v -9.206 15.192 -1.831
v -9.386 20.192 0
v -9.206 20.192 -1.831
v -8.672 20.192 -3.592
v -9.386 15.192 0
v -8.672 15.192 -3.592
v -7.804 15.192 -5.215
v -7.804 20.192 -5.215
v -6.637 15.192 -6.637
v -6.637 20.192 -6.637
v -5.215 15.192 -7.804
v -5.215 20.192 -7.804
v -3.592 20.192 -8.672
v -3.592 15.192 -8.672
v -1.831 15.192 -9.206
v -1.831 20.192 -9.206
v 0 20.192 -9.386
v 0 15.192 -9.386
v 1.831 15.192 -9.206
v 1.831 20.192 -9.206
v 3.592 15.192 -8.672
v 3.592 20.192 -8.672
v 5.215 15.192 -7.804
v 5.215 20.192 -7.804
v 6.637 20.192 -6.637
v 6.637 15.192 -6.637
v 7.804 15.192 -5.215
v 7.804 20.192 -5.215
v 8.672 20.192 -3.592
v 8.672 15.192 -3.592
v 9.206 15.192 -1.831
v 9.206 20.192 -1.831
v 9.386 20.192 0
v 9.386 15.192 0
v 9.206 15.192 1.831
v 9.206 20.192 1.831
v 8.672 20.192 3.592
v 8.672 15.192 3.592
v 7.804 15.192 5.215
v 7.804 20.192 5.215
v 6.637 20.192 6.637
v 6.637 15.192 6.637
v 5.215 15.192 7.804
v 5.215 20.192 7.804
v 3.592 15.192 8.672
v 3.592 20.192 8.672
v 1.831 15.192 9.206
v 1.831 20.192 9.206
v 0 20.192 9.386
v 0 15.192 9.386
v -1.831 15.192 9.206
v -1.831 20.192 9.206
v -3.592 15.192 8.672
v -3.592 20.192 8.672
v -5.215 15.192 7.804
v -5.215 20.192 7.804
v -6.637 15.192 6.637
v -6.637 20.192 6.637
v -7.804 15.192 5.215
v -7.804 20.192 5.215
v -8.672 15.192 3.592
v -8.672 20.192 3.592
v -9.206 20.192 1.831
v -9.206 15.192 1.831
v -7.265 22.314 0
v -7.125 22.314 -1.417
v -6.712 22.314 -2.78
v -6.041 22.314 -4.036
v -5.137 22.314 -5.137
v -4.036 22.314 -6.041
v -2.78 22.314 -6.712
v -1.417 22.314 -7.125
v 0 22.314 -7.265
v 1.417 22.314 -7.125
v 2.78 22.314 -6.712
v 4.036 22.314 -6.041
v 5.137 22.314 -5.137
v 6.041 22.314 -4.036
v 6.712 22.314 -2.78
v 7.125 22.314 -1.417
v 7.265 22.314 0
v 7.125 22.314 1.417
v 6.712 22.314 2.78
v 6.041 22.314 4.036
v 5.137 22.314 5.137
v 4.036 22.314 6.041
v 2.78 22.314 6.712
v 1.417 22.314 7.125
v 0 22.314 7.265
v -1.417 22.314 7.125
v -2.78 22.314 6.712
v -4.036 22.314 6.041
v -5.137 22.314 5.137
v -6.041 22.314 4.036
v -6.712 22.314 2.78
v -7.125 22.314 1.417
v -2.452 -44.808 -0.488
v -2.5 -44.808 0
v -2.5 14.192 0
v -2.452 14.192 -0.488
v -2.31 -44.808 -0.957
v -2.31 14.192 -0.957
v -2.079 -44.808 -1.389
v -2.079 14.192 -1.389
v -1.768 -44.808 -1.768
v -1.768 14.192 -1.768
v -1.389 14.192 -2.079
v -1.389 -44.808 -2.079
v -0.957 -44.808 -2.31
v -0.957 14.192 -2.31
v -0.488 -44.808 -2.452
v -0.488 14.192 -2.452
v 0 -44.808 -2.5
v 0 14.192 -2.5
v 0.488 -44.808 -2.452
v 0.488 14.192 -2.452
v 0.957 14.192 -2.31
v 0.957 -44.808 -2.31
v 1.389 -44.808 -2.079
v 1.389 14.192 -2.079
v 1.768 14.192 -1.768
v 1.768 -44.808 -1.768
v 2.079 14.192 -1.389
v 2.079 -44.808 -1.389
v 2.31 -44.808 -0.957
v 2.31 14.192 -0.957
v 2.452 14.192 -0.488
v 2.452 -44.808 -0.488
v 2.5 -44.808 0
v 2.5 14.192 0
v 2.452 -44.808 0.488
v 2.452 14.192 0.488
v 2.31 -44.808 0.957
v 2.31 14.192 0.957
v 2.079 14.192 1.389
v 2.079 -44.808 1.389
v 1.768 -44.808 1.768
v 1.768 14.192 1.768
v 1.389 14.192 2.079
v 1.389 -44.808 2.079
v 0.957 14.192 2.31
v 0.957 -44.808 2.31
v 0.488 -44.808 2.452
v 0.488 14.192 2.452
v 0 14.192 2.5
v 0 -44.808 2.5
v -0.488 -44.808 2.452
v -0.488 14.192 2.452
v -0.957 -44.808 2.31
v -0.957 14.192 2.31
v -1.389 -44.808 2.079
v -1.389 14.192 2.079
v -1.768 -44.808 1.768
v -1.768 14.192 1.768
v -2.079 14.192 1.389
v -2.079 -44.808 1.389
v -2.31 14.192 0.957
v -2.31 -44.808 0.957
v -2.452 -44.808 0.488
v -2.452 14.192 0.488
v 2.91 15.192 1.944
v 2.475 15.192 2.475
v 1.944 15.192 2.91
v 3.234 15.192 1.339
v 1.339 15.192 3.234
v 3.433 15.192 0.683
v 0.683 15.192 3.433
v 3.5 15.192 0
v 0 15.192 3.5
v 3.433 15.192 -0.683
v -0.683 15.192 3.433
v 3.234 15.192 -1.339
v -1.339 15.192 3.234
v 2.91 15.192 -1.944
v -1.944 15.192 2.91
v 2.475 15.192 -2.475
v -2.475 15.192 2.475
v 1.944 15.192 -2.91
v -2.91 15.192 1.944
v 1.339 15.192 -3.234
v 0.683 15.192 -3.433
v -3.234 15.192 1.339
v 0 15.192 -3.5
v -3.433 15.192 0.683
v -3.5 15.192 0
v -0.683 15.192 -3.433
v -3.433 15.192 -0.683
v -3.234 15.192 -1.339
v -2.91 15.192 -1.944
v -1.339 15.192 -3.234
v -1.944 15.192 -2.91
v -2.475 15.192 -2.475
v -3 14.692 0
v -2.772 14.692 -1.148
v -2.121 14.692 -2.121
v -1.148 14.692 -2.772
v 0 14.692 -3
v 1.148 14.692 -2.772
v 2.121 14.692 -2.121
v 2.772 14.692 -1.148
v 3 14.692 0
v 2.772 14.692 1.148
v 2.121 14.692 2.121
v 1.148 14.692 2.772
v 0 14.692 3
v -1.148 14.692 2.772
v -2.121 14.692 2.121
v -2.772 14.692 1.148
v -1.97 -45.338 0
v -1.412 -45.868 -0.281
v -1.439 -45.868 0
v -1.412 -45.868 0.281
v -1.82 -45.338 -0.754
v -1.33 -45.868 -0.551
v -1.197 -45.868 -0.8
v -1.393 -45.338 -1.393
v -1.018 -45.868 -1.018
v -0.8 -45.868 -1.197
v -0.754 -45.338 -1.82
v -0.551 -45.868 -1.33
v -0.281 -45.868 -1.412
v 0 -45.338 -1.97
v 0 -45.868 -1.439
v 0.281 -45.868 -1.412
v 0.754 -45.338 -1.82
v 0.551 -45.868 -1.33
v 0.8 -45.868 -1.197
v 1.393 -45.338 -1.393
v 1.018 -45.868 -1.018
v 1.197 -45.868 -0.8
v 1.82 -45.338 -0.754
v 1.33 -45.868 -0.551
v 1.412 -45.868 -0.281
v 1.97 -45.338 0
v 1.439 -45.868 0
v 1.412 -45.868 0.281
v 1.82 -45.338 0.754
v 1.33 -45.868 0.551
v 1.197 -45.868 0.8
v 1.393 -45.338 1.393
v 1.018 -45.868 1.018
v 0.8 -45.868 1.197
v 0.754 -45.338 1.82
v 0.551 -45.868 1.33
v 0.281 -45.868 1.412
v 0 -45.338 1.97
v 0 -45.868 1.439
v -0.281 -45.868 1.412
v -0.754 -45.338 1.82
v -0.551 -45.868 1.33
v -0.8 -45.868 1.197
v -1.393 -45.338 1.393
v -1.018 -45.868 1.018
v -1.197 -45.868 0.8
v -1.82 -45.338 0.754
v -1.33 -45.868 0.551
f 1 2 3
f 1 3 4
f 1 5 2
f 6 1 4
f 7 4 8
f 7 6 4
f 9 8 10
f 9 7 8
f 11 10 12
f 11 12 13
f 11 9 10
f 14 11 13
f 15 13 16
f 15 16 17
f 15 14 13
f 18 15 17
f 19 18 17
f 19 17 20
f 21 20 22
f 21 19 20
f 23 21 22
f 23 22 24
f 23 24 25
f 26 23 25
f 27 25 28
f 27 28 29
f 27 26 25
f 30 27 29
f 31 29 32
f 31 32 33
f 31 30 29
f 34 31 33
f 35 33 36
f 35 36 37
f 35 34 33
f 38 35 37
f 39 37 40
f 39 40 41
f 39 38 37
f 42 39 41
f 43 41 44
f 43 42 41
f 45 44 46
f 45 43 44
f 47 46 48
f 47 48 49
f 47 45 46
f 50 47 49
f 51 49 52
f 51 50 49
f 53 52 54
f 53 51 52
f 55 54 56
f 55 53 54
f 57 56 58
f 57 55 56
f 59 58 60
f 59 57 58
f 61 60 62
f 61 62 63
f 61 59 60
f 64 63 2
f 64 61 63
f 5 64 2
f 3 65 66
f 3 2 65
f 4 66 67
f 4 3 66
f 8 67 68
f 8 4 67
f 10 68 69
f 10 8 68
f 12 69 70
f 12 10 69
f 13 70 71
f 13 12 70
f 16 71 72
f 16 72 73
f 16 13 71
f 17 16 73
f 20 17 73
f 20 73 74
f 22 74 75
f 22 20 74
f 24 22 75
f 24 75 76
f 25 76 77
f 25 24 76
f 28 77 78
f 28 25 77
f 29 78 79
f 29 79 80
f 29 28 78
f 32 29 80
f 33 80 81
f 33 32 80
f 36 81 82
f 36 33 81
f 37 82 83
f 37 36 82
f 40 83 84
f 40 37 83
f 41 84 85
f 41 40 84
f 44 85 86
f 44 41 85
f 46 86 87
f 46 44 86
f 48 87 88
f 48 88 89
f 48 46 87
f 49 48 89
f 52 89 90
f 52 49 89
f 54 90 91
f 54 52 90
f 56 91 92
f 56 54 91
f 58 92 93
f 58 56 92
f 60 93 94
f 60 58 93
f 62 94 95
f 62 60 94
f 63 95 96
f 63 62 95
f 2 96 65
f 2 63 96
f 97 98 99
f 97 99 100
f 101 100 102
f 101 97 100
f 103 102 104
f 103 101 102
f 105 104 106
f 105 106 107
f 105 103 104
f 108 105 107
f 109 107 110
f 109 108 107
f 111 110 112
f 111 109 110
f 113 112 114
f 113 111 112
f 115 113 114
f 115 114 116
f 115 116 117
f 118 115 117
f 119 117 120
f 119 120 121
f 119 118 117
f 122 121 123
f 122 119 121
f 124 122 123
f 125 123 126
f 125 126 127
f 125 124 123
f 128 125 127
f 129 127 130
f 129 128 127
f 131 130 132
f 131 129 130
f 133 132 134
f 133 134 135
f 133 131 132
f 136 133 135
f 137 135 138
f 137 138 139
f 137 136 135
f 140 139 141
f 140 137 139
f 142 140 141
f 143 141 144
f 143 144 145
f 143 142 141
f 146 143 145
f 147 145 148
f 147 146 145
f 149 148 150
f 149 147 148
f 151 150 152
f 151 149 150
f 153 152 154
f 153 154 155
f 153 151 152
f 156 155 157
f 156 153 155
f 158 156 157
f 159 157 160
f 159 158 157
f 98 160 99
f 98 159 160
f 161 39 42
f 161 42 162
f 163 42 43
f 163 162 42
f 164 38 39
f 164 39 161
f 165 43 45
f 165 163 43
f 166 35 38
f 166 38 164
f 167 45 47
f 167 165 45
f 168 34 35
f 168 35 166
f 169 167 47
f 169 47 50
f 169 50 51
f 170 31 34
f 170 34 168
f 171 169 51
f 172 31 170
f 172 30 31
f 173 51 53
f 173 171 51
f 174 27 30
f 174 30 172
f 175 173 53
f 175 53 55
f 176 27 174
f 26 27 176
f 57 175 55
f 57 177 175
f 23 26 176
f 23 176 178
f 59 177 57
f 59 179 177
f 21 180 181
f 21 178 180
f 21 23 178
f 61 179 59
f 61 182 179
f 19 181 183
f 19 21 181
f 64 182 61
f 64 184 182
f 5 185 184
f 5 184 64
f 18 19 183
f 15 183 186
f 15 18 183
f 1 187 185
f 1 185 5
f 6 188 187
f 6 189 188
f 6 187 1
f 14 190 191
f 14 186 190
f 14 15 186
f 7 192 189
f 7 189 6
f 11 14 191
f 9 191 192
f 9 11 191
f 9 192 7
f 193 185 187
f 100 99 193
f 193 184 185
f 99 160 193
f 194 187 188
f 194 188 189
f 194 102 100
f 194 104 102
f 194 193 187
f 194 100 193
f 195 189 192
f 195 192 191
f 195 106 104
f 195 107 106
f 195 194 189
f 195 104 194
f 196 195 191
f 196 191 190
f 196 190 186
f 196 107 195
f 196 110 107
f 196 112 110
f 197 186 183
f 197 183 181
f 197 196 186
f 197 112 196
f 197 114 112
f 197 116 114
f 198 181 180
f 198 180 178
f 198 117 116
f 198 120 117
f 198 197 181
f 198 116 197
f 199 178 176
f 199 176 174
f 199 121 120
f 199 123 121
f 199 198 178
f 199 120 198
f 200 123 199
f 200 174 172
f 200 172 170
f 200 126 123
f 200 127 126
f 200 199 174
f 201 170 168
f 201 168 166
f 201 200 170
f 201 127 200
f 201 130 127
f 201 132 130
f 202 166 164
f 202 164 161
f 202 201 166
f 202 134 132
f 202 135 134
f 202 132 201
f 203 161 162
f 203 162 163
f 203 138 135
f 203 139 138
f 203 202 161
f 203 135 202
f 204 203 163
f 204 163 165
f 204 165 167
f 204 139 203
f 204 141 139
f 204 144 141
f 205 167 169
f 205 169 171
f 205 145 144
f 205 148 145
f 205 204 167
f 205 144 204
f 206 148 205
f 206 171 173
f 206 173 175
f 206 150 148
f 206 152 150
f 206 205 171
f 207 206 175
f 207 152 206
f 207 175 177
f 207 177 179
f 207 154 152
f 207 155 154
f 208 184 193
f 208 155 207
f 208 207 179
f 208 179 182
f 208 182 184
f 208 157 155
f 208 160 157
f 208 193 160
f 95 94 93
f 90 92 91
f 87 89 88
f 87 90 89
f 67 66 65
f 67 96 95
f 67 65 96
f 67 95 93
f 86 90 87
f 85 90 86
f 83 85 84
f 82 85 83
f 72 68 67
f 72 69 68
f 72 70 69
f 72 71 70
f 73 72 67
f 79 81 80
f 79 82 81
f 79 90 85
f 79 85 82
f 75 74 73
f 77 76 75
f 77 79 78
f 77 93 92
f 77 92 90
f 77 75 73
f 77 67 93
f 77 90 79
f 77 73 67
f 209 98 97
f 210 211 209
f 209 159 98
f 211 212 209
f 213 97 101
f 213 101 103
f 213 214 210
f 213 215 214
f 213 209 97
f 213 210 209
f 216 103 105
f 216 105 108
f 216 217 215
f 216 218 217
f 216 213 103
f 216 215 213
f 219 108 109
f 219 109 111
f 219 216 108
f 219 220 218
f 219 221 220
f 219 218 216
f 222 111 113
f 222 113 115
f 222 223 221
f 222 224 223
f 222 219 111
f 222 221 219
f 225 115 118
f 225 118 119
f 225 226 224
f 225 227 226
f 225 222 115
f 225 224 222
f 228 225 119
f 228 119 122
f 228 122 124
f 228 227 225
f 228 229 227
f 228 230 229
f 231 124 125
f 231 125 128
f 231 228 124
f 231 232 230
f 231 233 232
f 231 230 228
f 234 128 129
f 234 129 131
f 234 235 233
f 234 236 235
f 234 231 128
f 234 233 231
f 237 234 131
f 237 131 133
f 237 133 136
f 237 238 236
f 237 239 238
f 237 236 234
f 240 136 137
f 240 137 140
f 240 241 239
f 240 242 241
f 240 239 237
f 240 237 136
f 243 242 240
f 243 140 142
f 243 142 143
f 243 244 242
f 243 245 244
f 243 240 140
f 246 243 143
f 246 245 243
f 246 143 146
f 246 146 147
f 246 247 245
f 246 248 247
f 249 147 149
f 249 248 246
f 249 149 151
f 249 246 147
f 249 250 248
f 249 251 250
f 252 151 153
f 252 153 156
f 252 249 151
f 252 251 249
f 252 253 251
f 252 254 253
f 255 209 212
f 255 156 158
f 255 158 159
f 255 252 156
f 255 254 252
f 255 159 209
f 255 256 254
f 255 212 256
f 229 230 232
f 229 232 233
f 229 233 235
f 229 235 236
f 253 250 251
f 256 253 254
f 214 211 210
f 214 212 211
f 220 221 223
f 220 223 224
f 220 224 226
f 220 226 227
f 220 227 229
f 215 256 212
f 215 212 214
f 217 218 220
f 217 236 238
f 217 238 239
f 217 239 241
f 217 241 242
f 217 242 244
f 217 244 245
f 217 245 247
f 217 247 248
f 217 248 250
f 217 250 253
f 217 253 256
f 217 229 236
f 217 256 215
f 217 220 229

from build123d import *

# Parameters (mm, degrees)
CHAMFER3_SIZE = 1


with BuildPart() as part:
    # Sketch2 → Revolve1 (revolve)
    with BuildSketch(Plane.XY):
        Polygon((0, 22.313788144), (-7.264862559, 22.313788144), (-9.386182903, 20.192467801), (-9.386182903, 15.192467801), (-2.5, 15.192467801), (-2.5, -44.807532199), (-1.439339828, -45.868192371), (0, -45.868192371), align=None)
    revolve(axis=Axis((0, 22.313788144, 0), (0, -1, 0)))

    # Chamfer3
    chamfer3_edges = [part.edges().sort_by_distance(p)[0] for p in [
        (2.5, 15.192467801, 0),
    ]]
    chamfer(chamfer3_edges, length=CHAMFER3_SIZE)


solid = part.part
